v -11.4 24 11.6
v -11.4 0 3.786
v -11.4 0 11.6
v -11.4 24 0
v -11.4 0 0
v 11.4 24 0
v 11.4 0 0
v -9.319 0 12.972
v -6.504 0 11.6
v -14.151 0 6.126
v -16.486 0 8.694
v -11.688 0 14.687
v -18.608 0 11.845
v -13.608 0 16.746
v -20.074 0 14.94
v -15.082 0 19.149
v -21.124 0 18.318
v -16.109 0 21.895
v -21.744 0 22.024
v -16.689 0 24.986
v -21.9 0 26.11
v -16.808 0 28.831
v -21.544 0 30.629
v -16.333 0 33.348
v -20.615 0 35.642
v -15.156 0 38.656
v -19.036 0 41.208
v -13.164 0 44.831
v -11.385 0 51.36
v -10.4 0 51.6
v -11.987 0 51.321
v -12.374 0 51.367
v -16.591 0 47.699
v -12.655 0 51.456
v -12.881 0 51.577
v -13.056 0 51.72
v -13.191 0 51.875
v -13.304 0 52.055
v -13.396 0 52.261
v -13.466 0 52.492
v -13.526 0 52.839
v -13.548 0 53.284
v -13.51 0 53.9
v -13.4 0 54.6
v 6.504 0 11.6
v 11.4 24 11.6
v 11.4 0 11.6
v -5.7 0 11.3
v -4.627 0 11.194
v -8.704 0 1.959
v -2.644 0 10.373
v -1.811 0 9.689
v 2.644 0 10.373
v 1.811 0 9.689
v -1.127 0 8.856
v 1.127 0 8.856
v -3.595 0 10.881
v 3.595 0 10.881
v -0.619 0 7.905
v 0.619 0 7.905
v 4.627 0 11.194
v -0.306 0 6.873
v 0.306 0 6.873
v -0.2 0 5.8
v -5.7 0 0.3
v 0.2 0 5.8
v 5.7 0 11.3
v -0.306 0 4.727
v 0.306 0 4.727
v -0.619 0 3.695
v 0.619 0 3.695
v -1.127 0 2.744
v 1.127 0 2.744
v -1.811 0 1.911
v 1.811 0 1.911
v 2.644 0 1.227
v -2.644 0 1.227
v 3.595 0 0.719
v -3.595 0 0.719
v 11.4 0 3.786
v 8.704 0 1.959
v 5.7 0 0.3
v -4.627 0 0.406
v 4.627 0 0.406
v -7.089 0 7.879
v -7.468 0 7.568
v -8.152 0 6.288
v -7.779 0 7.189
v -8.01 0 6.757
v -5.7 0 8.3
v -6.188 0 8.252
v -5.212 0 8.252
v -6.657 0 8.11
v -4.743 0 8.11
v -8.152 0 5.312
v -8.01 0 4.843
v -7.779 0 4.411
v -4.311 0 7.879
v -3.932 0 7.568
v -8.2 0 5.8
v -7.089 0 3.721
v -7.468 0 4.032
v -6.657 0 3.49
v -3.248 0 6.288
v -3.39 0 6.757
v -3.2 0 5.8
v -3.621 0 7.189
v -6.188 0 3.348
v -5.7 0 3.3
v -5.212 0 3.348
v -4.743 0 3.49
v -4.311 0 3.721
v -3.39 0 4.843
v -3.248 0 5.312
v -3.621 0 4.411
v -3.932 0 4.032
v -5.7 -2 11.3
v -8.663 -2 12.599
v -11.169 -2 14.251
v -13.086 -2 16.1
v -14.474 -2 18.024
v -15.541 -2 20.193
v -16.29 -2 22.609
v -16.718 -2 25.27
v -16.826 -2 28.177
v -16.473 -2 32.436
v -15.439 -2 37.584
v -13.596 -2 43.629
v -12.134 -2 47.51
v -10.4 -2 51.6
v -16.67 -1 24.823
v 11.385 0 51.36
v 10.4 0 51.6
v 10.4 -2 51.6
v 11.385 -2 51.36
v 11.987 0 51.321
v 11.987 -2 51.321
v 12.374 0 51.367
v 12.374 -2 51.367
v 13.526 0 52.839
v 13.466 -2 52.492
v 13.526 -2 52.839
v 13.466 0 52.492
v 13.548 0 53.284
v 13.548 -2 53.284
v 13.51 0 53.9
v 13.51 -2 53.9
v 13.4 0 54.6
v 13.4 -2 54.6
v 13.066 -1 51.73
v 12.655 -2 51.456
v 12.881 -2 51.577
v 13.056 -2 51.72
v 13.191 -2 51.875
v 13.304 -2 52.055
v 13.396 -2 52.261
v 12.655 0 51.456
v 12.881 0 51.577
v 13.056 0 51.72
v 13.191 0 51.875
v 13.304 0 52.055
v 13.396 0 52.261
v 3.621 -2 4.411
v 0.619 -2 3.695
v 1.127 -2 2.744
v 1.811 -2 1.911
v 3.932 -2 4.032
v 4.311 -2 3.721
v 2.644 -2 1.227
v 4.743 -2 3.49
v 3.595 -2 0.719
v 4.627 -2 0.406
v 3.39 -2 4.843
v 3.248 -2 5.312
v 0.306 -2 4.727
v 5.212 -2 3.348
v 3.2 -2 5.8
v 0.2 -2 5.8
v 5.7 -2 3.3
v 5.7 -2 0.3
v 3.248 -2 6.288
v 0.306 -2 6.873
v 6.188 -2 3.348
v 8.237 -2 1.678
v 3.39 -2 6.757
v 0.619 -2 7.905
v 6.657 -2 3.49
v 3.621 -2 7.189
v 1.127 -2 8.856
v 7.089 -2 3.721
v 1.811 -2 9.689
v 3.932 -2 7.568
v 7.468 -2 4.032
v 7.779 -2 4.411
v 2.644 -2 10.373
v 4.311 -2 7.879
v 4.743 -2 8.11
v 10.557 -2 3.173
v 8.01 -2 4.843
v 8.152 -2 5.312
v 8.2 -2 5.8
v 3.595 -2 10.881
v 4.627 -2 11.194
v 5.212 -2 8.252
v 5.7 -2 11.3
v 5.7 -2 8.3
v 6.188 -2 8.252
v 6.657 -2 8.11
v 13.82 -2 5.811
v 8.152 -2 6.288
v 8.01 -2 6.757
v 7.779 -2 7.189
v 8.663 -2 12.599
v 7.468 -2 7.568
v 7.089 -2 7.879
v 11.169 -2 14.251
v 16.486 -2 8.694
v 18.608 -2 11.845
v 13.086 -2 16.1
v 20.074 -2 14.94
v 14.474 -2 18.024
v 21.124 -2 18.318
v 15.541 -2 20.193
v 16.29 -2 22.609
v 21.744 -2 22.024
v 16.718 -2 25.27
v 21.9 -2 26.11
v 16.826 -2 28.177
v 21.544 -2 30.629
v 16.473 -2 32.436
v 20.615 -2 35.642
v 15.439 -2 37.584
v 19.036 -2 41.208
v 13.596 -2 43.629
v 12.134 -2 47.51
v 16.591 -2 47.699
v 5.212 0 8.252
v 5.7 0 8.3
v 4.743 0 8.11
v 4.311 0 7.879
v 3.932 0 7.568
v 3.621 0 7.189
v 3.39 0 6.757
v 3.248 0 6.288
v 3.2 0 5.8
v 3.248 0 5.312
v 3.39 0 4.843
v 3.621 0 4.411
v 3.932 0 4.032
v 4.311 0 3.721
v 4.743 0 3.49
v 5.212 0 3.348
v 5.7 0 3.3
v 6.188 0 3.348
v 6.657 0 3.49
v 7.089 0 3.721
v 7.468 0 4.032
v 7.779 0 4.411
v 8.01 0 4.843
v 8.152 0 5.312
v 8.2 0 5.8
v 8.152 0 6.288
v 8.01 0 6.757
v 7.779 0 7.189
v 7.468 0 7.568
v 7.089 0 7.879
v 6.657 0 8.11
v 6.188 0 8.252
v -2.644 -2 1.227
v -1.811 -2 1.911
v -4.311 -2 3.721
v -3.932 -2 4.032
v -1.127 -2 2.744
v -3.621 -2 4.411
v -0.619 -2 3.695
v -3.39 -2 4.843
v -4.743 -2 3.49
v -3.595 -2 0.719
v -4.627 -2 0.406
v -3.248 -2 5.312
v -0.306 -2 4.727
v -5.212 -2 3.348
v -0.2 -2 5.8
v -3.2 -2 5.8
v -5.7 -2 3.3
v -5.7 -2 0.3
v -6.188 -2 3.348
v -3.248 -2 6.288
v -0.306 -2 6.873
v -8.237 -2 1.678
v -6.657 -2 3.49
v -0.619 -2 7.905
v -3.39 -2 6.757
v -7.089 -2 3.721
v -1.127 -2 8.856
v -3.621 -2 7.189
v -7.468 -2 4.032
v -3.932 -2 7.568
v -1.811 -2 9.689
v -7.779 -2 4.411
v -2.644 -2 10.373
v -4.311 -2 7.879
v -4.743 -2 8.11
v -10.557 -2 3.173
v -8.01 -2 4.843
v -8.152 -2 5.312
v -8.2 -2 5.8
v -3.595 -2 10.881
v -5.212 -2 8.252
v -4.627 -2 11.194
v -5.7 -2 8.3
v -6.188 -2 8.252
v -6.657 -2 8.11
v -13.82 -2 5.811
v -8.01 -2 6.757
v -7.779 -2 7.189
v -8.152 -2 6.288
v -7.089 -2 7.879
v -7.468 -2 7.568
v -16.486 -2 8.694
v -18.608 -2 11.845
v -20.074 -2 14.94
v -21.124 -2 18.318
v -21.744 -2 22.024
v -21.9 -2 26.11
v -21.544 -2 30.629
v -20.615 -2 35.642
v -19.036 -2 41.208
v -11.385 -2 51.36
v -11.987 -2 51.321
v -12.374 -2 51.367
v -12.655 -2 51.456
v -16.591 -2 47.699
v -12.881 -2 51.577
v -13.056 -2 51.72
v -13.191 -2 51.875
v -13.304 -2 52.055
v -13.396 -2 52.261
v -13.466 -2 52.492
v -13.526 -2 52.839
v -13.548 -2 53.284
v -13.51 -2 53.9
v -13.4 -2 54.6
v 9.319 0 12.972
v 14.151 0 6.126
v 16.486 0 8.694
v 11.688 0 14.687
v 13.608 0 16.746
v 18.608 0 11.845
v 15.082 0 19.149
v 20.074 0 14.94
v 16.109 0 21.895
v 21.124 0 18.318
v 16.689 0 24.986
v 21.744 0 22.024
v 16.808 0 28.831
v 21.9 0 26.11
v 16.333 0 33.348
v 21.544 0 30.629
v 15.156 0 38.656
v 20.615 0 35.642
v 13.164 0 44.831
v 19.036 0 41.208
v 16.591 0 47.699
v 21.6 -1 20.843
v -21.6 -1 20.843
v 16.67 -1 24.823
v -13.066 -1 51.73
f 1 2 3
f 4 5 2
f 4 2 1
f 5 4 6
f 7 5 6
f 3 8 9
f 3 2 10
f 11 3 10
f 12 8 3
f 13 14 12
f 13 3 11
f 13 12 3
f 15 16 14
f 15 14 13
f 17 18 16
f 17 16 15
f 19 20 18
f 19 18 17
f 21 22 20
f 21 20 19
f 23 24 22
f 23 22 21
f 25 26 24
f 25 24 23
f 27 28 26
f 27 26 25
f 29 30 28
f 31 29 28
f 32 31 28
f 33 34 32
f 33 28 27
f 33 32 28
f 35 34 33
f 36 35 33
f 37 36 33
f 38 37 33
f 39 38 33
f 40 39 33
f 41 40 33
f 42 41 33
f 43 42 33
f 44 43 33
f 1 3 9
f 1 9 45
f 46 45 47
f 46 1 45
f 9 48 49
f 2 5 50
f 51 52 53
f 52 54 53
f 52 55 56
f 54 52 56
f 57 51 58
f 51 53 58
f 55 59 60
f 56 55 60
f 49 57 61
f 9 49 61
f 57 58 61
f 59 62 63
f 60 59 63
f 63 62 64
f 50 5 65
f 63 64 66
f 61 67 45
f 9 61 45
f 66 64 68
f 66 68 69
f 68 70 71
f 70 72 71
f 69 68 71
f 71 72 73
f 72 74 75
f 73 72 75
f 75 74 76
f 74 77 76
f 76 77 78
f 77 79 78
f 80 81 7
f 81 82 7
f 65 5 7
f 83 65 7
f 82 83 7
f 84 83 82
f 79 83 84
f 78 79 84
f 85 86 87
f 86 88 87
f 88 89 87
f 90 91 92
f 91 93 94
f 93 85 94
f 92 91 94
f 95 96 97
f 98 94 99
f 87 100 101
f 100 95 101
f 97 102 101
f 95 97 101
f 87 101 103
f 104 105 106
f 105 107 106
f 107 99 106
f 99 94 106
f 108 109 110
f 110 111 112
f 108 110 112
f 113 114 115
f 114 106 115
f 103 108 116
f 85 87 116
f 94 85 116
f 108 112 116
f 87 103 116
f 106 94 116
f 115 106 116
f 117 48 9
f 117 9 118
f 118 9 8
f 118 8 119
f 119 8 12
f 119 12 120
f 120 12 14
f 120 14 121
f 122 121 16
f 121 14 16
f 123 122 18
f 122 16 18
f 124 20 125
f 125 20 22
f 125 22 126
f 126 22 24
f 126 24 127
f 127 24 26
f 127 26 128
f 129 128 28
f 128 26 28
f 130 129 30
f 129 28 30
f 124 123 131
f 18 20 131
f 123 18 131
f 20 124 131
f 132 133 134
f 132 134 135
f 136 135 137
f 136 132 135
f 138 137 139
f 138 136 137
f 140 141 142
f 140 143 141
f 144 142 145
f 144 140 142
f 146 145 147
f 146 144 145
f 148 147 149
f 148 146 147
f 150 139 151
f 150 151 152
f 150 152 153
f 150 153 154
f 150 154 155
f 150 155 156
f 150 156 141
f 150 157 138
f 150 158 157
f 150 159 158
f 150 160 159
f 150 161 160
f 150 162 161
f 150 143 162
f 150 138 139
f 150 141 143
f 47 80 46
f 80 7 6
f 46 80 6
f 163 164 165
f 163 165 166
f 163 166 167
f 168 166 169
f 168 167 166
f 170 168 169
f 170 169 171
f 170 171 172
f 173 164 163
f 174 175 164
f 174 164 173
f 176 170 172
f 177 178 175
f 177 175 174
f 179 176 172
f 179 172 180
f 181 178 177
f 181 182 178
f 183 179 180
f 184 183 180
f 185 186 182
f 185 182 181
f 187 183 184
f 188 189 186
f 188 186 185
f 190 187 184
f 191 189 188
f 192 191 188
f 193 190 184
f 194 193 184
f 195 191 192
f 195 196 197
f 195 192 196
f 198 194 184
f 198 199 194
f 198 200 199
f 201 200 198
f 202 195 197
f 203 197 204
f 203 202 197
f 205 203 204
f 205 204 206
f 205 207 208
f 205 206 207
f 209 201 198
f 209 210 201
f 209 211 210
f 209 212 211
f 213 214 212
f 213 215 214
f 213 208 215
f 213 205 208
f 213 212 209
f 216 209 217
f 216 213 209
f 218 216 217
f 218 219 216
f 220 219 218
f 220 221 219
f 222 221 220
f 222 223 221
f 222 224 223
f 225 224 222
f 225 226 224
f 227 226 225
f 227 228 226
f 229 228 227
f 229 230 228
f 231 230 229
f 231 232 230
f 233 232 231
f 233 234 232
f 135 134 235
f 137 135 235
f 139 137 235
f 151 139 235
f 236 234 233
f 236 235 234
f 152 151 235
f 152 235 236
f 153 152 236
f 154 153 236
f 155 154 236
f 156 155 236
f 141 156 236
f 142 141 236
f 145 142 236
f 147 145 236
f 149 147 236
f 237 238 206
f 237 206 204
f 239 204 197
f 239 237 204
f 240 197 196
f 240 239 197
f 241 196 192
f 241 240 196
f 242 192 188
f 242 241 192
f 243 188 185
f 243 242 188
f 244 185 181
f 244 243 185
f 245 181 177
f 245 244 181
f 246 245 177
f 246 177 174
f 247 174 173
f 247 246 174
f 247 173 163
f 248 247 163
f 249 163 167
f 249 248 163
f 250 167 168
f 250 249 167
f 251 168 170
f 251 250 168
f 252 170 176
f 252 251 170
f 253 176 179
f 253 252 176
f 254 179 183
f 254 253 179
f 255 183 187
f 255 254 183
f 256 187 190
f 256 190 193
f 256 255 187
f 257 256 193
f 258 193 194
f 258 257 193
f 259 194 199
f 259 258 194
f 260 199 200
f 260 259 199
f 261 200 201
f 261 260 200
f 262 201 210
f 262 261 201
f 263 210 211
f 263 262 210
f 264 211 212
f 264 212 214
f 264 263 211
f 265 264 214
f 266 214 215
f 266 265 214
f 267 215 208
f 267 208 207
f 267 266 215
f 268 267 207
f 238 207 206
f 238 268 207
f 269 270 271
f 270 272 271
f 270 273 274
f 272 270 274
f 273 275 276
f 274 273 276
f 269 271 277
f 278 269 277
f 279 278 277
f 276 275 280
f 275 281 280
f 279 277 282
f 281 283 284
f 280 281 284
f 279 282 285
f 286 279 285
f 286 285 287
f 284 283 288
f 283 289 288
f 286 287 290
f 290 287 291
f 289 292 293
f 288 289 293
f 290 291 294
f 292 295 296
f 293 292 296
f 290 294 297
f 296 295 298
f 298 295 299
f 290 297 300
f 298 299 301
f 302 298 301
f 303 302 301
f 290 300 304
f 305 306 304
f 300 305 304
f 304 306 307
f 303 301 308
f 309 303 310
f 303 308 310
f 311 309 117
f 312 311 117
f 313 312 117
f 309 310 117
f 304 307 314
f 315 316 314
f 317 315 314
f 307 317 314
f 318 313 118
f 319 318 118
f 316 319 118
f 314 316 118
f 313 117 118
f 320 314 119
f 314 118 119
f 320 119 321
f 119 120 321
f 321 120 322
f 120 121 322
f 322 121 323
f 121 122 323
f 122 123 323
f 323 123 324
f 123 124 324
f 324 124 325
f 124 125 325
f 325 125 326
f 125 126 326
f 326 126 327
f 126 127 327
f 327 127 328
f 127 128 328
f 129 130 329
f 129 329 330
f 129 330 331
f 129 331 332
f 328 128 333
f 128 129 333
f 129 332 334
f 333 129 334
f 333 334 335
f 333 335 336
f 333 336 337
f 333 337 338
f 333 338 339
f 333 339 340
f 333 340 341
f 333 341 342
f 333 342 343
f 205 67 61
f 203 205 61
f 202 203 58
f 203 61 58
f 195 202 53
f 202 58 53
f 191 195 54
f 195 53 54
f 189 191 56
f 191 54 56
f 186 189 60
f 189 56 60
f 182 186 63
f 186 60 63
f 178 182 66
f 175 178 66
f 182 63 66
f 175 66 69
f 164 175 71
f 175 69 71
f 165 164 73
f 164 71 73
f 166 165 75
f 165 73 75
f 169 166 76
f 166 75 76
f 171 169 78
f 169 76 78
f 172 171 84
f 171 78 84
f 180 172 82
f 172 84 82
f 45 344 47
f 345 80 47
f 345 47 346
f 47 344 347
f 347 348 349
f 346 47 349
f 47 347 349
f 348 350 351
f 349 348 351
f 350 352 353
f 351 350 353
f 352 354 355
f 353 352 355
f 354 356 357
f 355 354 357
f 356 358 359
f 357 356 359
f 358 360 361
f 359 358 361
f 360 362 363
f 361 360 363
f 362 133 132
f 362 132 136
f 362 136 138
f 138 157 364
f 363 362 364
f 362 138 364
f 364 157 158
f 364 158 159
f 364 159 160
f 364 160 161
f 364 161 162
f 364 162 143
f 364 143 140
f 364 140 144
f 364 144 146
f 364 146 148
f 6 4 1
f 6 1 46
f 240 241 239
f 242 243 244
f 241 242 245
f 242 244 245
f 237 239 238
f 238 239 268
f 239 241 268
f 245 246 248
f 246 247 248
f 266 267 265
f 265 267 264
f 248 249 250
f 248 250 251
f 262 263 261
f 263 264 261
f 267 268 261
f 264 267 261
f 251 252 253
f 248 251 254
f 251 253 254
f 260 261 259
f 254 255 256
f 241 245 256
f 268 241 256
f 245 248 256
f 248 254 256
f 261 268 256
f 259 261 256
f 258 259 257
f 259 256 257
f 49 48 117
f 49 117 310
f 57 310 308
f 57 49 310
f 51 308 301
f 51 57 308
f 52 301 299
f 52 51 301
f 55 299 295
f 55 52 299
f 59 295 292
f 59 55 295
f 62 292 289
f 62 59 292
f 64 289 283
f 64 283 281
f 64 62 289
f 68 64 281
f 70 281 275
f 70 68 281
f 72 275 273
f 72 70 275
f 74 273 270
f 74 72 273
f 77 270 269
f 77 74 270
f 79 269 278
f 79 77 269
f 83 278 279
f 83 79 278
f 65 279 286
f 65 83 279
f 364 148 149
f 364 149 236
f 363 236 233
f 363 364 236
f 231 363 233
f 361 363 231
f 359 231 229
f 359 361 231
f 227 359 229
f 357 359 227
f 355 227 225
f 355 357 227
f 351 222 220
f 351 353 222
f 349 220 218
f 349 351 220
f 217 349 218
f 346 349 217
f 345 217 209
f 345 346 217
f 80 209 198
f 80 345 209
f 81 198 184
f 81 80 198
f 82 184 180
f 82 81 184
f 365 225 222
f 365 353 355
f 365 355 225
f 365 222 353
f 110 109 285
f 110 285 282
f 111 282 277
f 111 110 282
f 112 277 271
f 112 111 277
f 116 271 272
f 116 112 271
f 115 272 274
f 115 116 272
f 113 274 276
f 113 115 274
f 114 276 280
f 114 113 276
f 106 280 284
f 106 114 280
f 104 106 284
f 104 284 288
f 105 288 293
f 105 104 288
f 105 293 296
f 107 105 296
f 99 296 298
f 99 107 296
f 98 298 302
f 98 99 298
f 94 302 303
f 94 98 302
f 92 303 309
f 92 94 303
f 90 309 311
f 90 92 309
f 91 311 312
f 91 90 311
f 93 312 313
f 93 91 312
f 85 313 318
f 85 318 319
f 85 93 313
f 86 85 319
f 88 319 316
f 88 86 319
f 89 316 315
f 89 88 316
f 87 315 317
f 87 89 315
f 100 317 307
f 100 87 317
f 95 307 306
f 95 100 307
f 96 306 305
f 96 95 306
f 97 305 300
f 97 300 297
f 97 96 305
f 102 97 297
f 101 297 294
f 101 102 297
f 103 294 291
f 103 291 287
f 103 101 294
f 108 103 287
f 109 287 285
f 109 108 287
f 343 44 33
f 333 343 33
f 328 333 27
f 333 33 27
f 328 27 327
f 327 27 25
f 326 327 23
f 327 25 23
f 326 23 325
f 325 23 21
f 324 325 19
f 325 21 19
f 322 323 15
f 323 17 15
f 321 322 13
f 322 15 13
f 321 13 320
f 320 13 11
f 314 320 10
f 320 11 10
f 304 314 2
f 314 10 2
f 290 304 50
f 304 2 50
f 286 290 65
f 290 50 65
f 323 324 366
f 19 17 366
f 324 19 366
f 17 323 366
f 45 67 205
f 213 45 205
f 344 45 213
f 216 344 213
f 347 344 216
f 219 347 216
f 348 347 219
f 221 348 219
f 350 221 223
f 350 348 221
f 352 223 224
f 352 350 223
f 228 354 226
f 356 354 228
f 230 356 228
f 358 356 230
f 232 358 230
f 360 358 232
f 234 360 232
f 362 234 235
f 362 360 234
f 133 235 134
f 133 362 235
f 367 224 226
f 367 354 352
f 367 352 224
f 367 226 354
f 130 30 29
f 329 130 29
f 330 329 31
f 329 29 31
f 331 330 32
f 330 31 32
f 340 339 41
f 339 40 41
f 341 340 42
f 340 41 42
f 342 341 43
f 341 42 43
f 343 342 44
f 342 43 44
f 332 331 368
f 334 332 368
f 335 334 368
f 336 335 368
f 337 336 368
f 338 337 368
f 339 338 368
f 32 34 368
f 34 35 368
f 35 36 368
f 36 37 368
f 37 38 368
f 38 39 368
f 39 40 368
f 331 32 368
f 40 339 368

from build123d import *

# Parameters (mm, degrees)
CROQUIS1_W              = 22.8
CROQUIS1_H              = 24
SALIENTE_EXTRUIR2_DEPTH = 11.6
CROQUIS2_R              = 2.5
SALIENTE_EXTRUIR3_DEPTH = 2


with BuildPart() as part:
    # Croquis1 → Saliente-Extruir2 (new body)
    with BuildSketch(Plane.XY):
        with Locations((0, 12)):
            Rectangle(CROQUIS1_W, CROQUIS1_H)
    extrude(amount=SALIENTE_EXTRUIR2_DEPTH)

    # Croquis2 → Saliente-Extruir3 (add)
    # profile 1 of 2: a face of its own
    with BuildSketch(Plane.XZ):
        with BuildLine():
            ThreePointArc((-5.7, 11.3), (-0.2, 5.8), (-5.7, 0.3))
            add(Edge.make_bspline(
                [(-13.4, 54.6), (-33.650343632, 14.235003165), (-5.7, 0.3)],
                knots=[0, 0, 0, 1, 1, 1], degree=2))
            add(Edge.make_bspline(
                [(-10.4, 51.6), (-14.231568326, 50.359614524), (-13.4, 54.6)],
                knots=[0, 0, 0, 1, 1, 1], degree=2))
            add(Edge.make_bspline(
                [(-5.7, 11.3), (-25.29034591, 18.195219879), (-10.4, 51.6)],
                knots=[0, 0, 0, 1, 1, 1], degree=2))
        make_face()
        with Locations(Location((-5.7, 5.8, 0), (0, 0, 270))):
            Circle(CROQUIS2_R, mode=Mode.SUBTRACT)
    # profile 2 of 2: a face of its own
    with BuildSketch(Plane.XZ):
        with BuildLine():
            ThreePointArc((5.7, 11.3), (0.2, 5.8), (5.7, 0.3))
            add(Edge.make_bspline(
                [(13.4, 54.6), (33.650343632, 14.235003165), (5.7, 0.3)],
                knots=[0, 0, 0, 1, 1, 1], degree=2))
            add(Edge.make_bspline(
                [(10.4, 51.6), (14.231568326, 50.359614524), (13.4, 54.6)],
                knots=[0, 0, 0, 1, 1, 1], degree=2))
            add(Edge.make_bspline(
                [(5.7, 11.3), (25.29034591, 18.195219879), (10.4, 51.6)],
                knots=[0, 0, 0, 1, 1, 1], degree=2))
        make_face()
        with Locations(Location((5.7, 5.8, 0), (0, 0, 90))):
            Circle(CROQUIS2_R, mode=Mode.SUBTRACT)
    extrude(amount=SALIENTE_EXTRUIR3_DEPTH)


solid = part.part
